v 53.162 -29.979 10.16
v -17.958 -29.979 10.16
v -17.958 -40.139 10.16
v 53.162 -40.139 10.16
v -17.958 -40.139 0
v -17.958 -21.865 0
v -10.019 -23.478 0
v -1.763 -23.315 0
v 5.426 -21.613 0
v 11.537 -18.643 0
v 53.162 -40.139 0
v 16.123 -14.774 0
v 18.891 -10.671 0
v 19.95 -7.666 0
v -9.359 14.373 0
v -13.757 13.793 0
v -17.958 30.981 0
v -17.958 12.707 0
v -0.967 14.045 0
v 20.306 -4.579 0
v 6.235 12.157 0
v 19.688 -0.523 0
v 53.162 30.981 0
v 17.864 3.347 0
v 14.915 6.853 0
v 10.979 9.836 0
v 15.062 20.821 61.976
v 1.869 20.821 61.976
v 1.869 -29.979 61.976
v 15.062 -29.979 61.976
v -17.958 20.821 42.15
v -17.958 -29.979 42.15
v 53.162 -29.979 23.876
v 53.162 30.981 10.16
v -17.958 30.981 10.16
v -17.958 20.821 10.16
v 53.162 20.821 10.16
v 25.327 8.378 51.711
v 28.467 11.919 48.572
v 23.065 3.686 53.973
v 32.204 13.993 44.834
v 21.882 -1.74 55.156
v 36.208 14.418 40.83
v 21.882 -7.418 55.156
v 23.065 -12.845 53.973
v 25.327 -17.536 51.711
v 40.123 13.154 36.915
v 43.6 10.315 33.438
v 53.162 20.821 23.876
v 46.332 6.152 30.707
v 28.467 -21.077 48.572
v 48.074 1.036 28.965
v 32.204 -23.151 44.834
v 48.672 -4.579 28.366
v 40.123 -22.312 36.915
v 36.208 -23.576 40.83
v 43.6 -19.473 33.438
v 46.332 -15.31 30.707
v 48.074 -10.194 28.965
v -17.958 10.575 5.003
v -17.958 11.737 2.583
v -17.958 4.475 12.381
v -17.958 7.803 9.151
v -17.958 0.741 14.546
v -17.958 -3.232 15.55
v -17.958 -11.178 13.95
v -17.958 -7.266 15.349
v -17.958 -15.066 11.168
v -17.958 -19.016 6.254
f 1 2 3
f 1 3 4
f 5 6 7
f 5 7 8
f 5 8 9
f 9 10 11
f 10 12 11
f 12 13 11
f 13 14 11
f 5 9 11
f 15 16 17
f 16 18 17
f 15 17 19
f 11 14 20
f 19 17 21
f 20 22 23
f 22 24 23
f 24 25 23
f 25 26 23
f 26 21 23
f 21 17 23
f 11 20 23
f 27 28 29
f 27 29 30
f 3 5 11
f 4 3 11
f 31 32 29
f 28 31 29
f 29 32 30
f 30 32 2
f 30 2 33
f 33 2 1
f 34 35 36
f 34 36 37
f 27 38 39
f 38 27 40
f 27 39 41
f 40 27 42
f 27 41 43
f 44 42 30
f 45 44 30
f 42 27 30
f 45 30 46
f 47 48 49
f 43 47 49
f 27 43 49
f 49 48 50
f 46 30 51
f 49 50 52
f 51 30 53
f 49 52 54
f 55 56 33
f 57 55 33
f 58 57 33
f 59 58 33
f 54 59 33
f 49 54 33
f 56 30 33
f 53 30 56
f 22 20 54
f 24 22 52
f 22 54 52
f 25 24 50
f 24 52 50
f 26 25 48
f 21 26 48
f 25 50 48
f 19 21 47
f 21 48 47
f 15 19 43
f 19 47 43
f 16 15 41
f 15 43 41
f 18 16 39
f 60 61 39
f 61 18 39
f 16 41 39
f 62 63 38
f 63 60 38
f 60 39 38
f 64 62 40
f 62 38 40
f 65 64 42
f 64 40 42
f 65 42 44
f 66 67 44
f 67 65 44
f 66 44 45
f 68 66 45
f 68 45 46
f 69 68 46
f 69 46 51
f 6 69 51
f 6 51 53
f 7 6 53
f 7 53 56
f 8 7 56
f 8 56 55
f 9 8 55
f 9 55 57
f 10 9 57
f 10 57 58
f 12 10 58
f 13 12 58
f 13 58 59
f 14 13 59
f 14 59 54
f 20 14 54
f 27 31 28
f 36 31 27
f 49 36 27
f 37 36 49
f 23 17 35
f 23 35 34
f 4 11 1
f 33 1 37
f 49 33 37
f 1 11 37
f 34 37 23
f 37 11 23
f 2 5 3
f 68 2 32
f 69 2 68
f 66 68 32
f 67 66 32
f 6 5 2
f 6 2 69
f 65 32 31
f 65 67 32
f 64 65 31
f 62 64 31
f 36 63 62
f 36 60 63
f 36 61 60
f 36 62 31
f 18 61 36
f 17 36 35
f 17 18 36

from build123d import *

# Parameters (mm, degrees)
F0_W     = 71.12
F0_H     = 71.12
F1_DEPTH = 10.16
F2_W     = 71.12
F2_H     = 50.8
F3_DEPTH = 51.816
F5_DEPTH = 71.12
F7_DEPTH = 71.12
F8_R     = 19.05
F9_DEPTH = 101.6


with BuildPart() as f1:
    # F0 (on Top) → F1 (new body)
    with BuildSketch(Plane.XY):
        with Locations((17.602327, -4.579058)):
            Rectangle(F0_W, F0_H)
    extrude(amount=F1_DEPTH)

    # F2 (on face) → F3 (join)
    with BuildSketch(Plane.XY.offset(10.16)):
        with Locations((17.602327, -4.579058)):
            Rectangle(F2_W, F2_H)
    extrude(amount=F3_DEPTH)

    # F4 (on face) → F5 (cut)
    with BuildSketch(Plane.XZ.offset(29.979058)):
        Polygon((-17.957673, 61.976), (-17.957673, 42.149723), (1.868605, 61.976), align=None)
    extrude(amount=-F5_DEPTH, mode=Mode.SUBTRACT)

    # F6 (on face) → F7 (cut)
    with BuildSketch(Plane.XZ.offset(29.979058)):
        Polygon((15.062327, 61.976), (53.162327, 23.876), (53.162327, 61.976), align=None)
    extrude(amount=-F7_DEPTH, mode=Mode.SUBTRACT)

    # F8 (on face) → F9 (cut)
    with BuildSketch(Plane(origin=(38.519164, 0, 38.519164), x_dir=(0.707107, 0, -0.707107), z_dir=(0.707107, 0, 0.707107))):
        with Locations((-4.691439, -4.579058)):
            Circle(F8_R)
    extrude(amount=-F9_DEPTH, mode=Mode.SUBTRACT)


solid = f1.part
